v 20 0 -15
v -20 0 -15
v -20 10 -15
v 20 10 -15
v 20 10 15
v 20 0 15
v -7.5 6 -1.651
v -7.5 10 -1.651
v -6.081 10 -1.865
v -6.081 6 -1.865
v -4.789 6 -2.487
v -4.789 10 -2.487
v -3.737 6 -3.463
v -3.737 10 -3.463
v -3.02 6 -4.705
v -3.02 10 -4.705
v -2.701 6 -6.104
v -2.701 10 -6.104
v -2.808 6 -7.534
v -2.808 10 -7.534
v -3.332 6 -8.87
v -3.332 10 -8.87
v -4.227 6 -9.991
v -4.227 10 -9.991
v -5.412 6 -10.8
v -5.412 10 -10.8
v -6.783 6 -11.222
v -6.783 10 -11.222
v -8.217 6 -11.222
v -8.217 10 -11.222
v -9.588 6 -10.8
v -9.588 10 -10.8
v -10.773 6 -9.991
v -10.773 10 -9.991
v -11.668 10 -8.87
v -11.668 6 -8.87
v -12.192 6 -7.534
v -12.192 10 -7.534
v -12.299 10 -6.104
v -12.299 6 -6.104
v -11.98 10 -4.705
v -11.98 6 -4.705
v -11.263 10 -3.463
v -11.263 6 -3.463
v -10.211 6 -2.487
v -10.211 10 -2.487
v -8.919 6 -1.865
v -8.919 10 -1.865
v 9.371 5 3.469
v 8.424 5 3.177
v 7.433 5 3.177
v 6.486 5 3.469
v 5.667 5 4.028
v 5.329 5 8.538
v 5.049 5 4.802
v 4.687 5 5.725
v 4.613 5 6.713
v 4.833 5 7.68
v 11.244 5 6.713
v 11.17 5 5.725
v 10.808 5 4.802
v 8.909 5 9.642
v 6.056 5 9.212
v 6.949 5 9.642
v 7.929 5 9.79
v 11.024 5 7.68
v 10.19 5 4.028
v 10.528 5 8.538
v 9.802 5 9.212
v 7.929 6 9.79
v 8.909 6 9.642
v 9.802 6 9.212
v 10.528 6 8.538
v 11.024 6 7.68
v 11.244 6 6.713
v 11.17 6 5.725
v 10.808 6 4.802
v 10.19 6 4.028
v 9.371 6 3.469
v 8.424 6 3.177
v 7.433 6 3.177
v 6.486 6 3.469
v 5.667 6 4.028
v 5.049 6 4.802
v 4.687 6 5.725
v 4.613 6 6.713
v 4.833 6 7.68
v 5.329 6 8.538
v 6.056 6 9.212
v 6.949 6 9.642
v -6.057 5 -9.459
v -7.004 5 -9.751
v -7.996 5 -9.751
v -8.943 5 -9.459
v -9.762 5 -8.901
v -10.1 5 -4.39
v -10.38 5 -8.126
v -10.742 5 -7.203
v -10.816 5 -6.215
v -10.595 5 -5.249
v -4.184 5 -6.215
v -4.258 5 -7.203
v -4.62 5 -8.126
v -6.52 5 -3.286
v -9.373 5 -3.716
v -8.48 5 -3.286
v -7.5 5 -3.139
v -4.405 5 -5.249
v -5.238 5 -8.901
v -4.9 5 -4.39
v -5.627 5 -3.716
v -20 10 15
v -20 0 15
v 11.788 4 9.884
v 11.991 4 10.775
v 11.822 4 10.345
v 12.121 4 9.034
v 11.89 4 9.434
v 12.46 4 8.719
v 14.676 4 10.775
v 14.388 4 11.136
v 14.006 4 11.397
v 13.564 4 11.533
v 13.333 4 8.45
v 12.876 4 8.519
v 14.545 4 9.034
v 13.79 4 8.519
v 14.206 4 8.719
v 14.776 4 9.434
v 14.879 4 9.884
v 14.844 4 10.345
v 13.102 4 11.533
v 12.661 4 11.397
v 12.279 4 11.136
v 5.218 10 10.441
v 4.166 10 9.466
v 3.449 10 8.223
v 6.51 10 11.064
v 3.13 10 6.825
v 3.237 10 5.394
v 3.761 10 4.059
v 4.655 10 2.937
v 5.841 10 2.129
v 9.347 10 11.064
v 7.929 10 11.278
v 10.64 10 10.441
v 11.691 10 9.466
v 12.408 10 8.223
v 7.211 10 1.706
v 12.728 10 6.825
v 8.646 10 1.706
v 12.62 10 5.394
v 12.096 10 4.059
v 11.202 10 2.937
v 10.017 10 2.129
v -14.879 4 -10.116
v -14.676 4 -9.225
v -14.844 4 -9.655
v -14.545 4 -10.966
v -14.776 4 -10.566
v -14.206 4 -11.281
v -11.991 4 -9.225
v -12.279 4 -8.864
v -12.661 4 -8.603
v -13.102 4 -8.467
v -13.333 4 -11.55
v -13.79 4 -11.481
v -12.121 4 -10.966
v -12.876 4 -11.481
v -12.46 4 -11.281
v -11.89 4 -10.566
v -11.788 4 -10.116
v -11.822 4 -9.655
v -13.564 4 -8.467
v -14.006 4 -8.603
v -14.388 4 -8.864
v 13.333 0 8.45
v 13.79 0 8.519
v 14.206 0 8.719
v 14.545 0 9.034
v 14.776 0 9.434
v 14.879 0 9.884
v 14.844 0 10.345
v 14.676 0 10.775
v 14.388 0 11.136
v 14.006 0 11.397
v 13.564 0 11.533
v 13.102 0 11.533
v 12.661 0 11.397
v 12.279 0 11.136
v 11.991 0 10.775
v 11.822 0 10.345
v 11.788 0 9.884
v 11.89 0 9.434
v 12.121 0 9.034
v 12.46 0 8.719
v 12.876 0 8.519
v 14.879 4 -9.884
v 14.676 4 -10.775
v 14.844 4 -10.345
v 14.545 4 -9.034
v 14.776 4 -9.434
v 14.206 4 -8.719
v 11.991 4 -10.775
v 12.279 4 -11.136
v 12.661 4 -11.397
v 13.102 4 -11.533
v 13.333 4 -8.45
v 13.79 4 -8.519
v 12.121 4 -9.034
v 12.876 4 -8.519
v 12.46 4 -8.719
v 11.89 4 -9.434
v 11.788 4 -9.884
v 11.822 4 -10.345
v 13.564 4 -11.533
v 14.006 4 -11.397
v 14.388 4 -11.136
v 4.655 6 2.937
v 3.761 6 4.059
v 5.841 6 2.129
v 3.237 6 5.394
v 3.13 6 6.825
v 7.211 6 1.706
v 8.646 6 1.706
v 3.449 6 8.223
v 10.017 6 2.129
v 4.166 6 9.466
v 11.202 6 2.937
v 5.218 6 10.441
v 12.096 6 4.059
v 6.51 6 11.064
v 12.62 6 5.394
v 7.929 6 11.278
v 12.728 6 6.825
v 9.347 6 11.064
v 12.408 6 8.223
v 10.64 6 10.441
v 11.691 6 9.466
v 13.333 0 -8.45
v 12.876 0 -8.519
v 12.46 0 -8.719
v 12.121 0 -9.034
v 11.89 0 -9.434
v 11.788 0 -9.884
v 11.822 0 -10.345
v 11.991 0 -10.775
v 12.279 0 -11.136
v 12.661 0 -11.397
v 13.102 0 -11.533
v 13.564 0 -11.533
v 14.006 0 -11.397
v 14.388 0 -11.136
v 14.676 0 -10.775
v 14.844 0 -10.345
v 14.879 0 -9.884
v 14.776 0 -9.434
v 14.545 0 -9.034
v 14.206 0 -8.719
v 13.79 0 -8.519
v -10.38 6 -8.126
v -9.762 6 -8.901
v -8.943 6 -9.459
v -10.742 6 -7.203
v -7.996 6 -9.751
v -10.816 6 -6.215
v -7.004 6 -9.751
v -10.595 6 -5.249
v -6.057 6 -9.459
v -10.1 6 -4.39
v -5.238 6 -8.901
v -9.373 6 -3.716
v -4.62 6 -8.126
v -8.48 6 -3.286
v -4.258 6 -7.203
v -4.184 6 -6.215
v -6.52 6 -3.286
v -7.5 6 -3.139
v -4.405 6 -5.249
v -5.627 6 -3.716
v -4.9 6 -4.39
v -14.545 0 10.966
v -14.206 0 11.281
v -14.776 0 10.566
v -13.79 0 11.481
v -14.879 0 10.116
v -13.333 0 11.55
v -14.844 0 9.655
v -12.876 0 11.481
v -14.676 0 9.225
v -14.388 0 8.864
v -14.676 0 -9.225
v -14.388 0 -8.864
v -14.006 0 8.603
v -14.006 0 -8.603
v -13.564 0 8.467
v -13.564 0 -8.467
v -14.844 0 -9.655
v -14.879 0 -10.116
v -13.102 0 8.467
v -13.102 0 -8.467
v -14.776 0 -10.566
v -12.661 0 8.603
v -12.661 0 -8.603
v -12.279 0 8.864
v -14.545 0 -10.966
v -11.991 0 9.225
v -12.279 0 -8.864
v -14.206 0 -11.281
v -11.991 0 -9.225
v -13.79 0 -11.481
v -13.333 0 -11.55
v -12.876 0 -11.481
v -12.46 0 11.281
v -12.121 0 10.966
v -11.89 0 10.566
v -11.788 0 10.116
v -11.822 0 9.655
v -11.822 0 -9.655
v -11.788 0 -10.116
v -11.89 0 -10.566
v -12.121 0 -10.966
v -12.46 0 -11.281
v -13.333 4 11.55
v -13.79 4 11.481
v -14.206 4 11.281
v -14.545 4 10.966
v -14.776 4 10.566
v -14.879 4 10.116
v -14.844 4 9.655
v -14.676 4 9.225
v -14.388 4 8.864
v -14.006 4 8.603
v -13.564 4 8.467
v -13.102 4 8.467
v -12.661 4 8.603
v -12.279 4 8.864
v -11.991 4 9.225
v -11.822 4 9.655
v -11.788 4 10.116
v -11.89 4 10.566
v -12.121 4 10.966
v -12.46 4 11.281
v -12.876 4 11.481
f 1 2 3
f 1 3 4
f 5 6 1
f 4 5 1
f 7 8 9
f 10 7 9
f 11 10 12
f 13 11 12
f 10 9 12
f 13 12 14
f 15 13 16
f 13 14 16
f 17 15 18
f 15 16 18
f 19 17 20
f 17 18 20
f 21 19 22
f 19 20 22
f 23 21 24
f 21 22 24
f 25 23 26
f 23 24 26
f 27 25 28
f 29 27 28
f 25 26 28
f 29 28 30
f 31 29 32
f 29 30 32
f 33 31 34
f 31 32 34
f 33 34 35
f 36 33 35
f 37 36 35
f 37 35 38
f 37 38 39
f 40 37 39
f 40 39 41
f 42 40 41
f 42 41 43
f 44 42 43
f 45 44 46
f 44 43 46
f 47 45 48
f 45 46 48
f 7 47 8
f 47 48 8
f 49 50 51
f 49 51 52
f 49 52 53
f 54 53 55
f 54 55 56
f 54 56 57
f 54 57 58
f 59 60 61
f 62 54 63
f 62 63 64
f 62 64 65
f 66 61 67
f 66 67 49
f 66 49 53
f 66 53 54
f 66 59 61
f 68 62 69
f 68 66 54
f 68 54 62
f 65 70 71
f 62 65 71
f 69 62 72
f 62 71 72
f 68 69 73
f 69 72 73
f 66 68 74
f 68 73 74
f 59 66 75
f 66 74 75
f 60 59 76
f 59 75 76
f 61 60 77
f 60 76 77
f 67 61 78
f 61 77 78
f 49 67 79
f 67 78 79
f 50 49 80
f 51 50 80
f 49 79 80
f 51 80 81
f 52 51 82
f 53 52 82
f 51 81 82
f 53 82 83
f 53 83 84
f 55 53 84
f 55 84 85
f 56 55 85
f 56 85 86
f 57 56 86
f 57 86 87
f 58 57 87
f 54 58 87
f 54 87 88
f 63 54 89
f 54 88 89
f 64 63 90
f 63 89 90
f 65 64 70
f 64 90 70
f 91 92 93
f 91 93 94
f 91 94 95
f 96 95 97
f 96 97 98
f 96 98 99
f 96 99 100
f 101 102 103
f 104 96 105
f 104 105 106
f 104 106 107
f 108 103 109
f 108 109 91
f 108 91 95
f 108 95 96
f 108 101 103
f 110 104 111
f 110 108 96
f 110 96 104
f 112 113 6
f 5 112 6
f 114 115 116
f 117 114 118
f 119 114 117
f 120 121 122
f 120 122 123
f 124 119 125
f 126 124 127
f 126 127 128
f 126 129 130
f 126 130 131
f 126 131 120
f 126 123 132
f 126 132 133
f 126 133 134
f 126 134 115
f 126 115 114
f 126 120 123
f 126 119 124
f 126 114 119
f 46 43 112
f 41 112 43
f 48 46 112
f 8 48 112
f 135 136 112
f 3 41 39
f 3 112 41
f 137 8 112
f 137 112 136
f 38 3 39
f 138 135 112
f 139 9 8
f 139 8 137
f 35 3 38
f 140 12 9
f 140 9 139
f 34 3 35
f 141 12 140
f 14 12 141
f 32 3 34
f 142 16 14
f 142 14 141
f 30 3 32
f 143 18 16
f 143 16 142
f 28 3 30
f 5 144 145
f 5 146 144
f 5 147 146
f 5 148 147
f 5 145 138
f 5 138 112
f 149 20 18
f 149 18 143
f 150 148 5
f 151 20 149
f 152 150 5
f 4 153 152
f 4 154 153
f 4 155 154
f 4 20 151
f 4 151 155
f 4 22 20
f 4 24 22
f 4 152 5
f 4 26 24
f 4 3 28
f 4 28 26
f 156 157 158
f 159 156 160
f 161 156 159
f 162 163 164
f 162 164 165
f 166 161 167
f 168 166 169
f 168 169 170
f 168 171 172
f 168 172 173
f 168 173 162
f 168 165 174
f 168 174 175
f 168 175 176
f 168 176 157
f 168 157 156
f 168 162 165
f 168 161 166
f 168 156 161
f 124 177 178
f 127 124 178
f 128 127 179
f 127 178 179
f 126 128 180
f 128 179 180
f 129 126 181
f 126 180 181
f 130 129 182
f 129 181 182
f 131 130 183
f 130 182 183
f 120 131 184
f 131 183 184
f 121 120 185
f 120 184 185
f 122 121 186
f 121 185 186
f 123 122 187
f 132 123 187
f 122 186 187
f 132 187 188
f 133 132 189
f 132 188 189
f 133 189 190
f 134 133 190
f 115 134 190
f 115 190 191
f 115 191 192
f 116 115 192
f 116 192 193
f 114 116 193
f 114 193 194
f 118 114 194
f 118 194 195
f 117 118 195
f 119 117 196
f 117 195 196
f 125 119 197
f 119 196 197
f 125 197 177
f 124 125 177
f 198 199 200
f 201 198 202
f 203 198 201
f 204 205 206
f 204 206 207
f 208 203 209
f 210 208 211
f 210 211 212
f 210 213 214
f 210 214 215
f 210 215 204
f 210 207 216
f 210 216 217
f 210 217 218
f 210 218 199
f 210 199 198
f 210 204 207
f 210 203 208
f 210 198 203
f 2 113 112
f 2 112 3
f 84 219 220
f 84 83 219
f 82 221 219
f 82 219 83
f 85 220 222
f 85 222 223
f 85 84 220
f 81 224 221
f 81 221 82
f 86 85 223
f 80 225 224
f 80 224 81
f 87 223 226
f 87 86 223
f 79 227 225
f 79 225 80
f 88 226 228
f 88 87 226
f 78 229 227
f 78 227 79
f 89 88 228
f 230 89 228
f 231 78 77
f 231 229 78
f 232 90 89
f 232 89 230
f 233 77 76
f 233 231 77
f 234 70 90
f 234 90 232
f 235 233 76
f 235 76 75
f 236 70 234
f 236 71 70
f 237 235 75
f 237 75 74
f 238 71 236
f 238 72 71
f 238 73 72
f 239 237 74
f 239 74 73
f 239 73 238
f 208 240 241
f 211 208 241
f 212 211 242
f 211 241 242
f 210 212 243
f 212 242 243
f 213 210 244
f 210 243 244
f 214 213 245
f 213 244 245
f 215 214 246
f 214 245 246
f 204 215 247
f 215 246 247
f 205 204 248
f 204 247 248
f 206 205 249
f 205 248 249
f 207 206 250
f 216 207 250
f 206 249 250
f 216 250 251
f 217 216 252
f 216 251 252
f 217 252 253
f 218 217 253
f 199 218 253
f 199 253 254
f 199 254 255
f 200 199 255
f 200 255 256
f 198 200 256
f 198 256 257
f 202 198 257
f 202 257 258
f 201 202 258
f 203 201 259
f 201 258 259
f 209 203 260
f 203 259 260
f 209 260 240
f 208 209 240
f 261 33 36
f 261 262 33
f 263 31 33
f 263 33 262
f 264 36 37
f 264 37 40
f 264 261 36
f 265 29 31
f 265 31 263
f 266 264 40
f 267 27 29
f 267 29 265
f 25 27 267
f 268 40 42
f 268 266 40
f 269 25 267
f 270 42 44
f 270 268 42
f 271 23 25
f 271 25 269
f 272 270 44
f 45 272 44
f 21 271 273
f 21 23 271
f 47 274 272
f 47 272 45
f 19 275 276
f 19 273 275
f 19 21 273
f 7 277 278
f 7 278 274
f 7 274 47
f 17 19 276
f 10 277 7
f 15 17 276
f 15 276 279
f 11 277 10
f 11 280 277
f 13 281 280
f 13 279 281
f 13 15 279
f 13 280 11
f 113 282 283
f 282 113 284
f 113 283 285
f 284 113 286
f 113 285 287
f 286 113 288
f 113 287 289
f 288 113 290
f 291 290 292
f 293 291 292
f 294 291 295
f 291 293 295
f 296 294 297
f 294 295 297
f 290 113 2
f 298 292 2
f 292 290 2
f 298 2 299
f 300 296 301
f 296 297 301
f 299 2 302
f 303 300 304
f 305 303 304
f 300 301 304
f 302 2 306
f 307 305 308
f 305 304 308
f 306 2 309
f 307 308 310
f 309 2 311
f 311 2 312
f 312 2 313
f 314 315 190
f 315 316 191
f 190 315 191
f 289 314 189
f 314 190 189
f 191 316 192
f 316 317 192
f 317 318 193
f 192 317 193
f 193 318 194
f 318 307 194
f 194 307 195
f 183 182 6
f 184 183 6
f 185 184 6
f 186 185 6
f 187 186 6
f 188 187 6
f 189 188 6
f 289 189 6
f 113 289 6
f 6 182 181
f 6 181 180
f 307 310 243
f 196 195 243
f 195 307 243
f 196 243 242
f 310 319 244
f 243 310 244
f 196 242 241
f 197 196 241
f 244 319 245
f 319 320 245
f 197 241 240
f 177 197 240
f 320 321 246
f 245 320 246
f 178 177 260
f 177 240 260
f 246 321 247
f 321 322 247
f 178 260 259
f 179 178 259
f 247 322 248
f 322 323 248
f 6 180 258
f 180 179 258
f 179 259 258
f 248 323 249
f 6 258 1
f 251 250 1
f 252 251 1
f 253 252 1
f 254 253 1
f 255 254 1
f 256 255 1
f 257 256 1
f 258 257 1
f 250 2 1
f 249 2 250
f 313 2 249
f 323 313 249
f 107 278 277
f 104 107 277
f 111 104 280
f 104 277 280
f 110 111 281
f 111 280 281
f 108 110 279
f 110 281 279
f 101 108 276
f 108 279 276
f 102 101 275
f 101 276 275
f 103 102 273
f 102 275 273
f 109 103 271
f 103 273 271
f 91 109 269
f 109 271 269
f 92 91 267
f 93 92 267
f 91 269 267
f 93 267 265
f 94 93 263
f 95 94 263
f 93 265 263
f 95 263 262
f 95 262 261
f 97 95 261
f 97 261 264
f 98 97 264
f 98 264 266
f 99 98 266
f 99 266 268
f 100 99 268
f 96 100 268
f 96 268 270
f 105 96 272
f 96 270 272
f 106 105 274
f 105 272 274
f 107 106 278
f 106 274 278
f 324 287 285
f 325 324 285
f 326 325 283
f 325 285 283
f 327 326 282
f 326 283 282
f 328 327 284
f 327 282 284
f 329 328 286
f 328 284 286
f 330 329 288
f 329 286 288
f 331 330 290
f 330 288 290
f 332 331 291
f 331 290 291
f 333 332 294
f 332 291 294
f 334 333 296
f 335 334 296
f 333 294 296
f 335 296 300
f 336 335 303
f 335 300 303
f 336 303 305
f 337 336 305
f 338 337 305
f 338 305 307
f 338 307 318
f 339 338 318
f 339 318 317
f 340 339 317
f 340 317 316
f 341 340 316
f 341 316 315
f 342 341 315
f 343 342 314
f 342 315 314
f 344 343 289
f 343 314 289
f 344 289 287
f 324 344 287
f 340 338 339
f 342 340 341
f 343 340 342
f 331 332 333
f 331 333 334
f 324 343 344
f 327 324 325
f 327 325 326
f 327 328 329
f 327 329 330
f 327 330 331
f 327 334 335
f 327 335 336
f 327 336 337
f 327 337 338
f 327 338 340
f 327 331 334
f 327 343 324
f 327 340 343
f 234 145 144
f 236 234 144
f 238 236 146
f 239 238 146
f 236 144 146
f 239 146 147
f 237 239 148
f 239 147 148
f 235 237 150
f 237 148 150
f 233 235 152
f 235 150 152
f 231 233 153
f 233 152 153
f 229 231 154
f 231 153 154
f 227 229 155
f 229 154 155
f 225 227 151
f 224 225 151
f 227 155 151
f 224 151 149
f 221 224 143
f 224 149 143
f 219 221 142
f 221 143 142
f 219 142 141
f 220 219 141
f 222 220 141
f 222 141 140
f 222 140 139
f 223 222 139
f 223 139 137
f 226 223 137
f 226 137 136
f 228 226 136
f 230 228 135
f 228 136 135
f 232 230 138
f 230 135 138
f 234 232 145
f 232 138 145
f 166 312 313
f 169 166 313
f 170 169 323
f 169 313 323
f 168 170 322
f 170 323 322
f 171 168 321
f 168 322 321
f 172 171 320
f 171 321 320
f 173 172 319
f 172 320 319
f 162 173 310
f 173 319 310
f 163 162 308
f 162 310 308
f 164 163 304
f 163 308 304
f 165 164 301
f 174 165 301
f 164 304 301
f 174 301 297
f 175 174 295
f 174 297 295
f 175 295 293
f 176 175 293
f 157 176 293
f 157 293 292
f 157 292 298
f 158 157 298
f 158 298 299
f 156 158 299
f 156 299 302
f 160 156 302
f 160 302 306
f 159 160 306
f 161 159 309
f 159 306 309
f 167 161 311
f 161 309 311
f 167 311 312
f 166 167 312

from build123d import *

# Parameters (mm, degrees)
SKETCH2_W           = 40
SKETCH2_H           = 30
BOSS_EXTRUDE1_DEPTH = 10
SKETCH3_R           = 1.55
CUT_EXTRUDE1_DEPTH  = 4
SKETCH4_R           = 4.8125
CUT_EXTRUDE2_DEPTH  = 4
SKETCH7_R           = 3.325
CUT_EXTRUDE3_DEPTH  = 1


with BuildPart() as part:
    # Sketch2 → Boss-Extrude1 (new body)
    with BuildSketch(Plane(origin=(0, 0, 0), x_dir=(1, 0, 0), z_dir=(0, 1, 0))):
        Rectangle(SKETCH2_W, SKETCH2_H)
    extrude(amount=BOSS_EXTRUDE1_DEPTH)

    # Sketch3 → Cut-Extrude1 (cut)
    with BuildSketch(Plane(origin=(0, 0, 0), x_dir=(-1, 0, 0), z_dir=(0, -1, 0))):
        with Locations(Location((-13.333333333, -10, 0), (0, 0, 90))):
            Circle(SKETCH3_R)
        with Locations(Location((13.333333333, -10, 0), (0, 0, 270))):
            Circle(SKETCH3_R)
        with Locations(Location((-13.333333333, 10, 0), (0, 0, 270))):
            Circle(SKETCH3_R)
        with Locations(Location((13.333333333, 10, 0), (0, 0, 90))):
            Circle(SKETCH3_R)
    extrude(amount=-CUT_EXTRUDE1_DEPTH, mode=Mode.SUBTRACT)

    # Sketch4 → Cut-Extrude2 (cut)
    with BuildSketch(Plane(origin=(0, 10, 0), x_dir=(1, 0, 0), z_dir=(0, 1, 0))):
        with Locations(Location((7.9286, -6.465, 0), (0, 0, 270))):
            Circle(SKETCH4_R)
        with Locations(Location((-7.5, 6.4636, 0), (0, 0, 270))):
            Circle(SKETCH4_R)
    extrude(amount=-CUT_EXTRUDE2_DEPTH, mode=Mode.SUBTRACT)

    # Sketch7 → Cut-Extrude3 (cut)
    with BuildSketch(Plane(origin=(0, 6, 0), x_dir=(1, 0, 0), z_dir=(0, 1, 0))):
        with Locations(Location((7.9286, -6.465, 0), (0, 0, 270))):
            Circle(SKETCH7_R)
        with Locations(Location((-7.5, 6.4636, 0), (0, 0, 270))):
            Circle(SKETCH7_R)
    extrude(amount=-CUT_EXTRUDE3_DEPTH, mode=Mode.SUBTRACT)


solid = part.part
